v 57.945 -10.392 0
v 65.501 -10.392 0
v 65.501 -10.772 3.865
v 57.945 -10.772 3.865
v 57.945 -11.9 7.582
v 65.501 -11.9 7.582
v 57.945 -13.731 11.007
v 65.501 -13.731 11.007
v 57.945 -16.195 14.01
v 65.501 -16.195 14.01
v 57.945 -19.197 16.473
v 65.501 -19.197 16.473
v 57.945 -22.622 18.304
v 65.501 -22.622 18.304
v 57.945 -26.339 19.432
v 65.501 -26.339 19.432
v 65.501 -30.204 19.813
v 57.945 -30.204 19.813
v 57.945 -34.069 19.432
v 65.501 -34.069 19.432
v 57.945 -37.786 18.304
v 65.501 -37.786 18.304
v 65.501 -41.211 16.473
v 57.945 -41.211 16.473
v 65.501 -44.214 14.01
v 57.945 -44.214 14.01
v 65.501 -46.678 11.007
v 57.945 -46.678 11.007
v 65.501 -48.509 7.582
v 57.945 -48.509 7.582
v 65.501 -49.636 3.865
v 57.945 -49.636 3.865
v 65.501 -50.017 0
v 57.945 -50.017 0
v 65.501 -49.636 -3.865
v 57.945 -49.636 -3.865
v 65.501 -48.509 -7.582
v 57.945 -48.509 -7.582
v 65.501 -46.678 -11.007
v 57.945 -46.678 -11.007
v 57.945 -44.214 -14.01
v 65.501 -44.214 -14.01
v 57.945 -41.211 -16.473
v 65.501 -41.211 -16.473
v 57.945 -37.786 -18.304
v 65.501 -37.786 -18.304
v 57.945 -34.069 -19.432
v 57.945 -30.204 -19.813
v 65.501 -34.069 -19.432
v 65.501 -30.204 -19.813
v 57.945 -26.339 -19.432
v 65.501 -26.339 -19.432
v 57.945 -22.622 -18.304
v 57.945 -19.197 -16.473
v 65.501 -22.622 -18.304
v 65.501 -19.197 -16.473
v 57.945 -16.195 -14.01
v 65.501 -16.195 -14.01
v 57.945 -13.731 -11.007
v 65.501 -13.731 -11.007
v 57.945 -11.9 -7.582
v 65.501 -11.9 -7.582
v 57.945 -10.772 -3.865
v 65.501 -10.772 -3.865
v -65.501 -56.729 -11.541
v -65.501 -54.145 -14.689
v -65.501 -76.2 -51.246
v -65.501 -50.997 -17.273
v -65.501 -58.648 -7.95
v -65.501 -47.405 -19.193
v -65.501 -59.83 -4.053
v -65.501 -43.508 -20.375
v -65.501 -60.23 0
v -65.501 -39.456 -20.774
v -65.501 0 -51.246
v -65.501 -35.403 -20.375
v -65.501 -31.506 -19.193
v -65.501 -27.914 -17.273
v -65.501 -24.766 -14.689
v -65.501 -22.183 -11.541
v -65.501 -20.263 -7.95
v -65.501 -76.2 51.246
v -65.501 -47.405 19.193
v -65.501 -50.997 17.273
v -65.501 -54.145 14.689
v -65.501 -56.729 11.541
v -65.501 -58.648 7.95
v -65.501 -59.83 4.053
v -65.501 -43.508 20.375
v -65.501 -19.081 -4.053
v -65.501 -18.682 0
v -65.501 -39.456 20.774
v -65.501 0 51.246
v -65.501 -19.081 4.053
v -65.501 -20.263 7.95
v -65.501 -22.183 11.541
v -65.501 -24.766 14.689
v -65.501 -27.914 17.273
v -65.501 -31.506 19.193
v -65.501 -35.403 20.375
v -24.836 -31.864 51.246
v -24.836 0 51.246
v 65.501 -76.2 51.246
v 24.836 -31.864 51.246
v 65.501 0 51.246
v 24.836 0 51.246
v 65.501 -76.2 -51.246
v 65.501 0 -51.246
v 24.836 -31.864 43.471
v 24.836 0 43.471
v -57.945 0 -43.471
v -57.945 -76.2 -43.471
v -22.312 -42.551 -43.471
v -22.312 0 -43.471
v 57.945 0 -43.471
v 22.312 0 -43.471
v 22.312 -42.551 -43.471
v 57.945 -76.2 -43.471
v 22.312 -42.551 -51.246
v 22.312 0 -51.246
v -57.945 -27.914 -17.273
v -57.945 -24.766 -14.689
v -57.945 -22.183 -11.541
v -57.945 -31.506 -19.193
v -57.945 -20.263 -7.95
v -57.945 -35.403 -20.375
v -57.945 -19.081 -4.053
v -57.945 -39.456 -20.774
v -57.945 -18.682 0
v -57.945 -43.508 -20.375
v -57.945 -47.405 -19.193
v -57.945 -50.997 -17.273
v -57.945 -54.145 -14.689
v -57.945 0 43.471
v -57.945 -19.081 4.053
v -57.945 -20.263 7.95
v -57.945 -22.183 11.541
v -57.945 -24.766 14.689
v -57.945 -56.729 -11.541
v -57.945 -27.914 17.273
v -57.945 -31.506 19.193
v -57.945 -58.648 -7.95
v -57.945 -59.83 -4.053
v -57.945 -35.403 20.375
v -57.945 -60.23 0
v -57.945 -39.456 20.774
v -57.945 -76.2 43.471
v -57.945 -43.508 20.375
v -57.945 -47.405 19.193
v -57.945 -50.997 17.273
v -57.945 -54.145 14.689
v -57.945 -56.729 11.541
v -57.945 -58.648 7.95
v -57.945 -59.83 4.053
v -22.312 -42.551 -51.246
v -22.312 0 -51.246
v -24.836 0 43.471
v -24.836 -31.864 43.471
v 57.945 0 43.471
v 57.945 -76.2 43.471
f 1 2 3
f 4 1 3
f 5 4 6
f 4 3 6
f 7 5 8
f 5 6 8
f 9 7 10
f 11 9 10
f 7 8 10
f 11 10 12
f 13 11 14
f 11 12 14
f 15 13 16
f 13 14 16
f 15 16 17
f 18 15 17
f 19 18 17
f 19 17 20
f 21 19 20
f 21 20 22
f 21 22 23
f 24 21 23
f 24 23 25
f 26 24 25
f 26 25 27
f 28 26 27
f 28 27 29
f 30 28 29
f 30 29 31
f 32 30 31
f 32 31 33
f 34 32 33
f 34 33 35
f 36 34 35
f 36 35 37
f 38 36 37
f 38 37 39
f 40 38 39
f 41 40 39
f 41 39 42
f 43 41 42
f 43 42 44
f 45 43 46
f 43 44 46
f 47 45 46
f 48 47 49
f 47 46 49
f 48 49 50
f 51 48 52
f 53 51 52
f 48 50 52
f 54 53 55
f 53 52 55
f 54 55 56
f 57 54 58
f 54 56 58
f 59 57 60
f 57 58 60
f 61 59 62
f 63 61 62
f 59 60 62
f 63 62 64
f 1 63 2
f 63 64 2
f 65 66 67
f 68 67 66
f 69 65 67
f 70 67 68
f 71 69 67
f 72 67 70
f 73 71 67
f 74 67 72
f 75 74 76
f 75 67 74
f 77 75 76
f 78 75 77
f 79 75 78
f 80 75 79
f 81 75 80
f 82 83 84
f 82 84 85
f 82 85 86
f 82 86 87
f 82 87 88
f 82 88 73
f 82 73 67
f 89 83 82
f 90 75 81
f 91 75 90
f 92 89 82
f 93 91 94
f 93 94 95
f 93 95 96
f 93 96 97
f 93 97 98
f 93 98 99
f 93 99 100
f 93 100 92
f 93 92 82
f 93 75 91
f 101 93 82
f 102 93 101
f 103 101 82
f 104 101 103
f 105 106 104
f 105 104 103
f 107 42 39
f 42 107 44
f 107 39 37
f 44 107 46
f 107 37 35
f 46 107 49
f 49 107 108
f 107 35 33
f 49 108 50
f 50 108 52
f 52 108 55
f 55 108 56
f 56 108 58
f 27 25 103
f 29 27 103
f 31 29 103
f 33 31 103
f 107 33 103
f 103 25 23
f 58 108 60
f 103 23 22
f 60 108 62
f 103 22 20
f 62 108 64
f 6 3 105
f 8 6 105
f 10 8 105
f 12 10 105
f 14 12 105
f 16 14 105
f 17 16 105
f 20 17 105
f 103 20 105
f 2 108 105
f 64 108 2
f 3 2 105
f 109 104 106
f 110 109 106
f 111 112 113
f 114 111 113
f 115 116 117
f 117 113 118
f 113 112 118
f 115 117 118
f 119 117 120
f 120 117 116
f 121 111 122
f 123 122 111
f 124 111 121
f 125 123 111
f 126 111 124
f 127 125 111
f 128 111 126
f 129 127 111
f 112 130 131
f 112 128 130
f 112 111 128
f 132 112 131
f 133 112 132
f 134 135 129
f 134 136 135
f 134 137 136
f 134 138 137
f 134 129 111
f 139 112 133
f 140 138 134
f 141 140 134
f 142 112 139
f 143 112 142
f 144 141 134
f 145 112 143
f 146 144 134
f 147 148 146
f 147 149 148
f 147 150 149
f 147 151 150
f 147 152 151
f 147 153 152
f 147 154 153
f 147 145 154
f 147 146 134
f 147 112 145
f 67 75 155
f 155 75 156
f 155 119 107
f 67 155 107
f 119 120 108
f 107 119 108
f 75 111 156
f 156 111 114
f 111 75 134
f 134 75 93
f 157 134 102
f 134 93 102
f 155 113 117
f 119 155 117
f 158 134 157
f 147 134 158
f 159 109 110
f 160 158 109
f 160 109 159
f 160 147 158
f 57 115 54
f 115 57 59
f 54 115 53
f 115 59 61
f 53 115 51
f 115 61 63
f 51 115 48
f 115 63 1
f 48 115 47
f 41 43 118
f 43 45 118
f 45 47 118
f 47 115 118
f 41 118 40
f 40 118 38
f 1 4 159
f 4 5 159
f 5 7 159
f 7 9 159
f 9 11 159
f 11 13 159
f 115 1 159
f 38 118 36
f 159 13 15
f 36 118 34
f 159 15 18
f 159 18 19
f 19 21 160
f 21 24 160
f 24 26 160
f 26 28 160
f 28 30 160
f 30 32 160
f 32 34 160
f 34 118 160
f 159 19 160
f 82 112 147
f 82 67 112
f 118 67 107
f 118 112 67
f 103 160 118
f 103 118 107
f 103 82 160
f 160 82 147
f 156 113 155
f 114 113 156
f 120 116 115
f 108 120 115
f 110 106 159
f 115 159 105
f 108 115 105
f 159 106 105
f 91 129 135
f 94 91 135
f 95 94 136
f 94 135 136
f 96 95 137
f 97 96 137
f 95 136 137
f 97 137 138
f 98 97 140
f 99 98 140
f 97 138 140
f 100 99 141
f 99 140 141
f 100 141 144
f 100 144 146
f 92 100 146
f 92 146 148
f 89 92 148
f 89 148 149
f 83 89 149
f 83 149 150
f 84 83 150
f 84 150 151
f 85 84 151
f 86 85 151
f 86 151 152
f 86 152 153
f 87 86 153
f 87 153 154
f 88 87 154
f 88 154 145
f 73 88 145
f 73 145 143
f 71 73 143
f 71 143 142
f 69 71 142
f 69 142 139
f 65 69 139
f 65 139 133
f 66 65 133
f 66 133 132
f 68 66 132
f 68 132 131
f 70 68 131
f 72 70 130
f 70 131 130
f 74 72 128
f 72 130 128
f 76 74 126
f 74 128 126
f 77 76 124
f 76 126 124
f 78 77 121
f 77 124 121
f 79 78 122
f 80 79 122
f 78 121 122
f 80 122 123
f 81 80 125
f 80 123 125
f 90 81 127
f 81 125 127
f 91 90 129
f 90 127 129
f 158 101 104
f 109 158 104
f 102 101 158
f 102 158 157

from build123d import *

# Parameters (mm, degrees)
F0_W      = 131.0027092695
F0_H      = 102.4924069643
F1_DEPTH  = 76.2
F2_W      = 115.8900782466
F2_H      = 86.941331625
F3_DEPTH  = 38.1
F4_DEPTH  = 25.4
F5_DEPTH  = 76.2
F6_W      = 44.6236804128
F6_H      = 42.5505377352
F7_DEPTH  = 76.2
F8_W      = 49.6712476015
F8_H      = 31.8642035127
F9_DEPTH  = 76.2
F10_R     = 20.7740472605
F11_DEPTH = 76.2
F12_R     = 19.8125054643
F13_DEPTH = 25.4


with BuildPart() as f1:
    # F0 (on Front) → F1 (new body)
    with BuildSketch(Plane.XZ):
        Rectangle(F0_W, F0_H)
    extrude(amount=F1_DEPTH)

    # F2 (on Front) → F3 (cut, symmetric)
    with BuildSketch(Plane.XZ):
        Rectangle(F2_W, F2_H)
    extrude(amount=F3_DEPTH, both=True, mode=Mode.SUBTRACT)

    # F4 (cut): a face of the model
    f4_faces = [f1.faces().sort_by_distance(p)[0] for p in [
        (0, -38.1, 0),
    ]]
    extrude(f4_faces, amount=-F4_DEPTH, mode=Mode.SUBTRACT)

    # F5 (cut): a face of the model
    f5_faces = [f1.faces().sort_by_distance(p)[0] for p in [
        (0, -63.5, 0),
    ]]
    extrude(f5_faces, amount=-F5_DEPTH, mode=Mode.SUBTRACT)

    # F6 (on Top) → F7 (cut)
    with BuildSketch(Plane.XY):
        with Locations((0, -21.2752688676)):
            Rectangle(F6_W, F6_H)
    extrude(amount=-F7_DEPTH, mode=Mode.SUBTRACT)

    # F8 (on face) → F9 (cut)
    with BuildSketch(Plane.XY.offset(51.2462034822)):
        with Locations((0, -15.9321017563)):
            Rectangle(F8_W, F8_H)
    extrude(amount=-F9_DEPTH, mode=Mode.SUBTRACT)

    # F10 (on Right) → F11 (cut)
    with BuildSketch(Plane.YZ):
        with Locations((-39.45556283, 0)):
            Circle(F10_R)
    extrude(amount=-F11_DEPTH, mode=Mode.SUBTRACT)

    # F12 (on face) → F13 (cut)
    with BuildSketch(Plane.YZ.offset(65.5013546348)):
        with Locations((-30.2042365074, 0)):
            Circle(F12_R)
    extrude(amount=-F13_DEPTH, mode=Mode.SUBTRACT)


solid = f1.part
